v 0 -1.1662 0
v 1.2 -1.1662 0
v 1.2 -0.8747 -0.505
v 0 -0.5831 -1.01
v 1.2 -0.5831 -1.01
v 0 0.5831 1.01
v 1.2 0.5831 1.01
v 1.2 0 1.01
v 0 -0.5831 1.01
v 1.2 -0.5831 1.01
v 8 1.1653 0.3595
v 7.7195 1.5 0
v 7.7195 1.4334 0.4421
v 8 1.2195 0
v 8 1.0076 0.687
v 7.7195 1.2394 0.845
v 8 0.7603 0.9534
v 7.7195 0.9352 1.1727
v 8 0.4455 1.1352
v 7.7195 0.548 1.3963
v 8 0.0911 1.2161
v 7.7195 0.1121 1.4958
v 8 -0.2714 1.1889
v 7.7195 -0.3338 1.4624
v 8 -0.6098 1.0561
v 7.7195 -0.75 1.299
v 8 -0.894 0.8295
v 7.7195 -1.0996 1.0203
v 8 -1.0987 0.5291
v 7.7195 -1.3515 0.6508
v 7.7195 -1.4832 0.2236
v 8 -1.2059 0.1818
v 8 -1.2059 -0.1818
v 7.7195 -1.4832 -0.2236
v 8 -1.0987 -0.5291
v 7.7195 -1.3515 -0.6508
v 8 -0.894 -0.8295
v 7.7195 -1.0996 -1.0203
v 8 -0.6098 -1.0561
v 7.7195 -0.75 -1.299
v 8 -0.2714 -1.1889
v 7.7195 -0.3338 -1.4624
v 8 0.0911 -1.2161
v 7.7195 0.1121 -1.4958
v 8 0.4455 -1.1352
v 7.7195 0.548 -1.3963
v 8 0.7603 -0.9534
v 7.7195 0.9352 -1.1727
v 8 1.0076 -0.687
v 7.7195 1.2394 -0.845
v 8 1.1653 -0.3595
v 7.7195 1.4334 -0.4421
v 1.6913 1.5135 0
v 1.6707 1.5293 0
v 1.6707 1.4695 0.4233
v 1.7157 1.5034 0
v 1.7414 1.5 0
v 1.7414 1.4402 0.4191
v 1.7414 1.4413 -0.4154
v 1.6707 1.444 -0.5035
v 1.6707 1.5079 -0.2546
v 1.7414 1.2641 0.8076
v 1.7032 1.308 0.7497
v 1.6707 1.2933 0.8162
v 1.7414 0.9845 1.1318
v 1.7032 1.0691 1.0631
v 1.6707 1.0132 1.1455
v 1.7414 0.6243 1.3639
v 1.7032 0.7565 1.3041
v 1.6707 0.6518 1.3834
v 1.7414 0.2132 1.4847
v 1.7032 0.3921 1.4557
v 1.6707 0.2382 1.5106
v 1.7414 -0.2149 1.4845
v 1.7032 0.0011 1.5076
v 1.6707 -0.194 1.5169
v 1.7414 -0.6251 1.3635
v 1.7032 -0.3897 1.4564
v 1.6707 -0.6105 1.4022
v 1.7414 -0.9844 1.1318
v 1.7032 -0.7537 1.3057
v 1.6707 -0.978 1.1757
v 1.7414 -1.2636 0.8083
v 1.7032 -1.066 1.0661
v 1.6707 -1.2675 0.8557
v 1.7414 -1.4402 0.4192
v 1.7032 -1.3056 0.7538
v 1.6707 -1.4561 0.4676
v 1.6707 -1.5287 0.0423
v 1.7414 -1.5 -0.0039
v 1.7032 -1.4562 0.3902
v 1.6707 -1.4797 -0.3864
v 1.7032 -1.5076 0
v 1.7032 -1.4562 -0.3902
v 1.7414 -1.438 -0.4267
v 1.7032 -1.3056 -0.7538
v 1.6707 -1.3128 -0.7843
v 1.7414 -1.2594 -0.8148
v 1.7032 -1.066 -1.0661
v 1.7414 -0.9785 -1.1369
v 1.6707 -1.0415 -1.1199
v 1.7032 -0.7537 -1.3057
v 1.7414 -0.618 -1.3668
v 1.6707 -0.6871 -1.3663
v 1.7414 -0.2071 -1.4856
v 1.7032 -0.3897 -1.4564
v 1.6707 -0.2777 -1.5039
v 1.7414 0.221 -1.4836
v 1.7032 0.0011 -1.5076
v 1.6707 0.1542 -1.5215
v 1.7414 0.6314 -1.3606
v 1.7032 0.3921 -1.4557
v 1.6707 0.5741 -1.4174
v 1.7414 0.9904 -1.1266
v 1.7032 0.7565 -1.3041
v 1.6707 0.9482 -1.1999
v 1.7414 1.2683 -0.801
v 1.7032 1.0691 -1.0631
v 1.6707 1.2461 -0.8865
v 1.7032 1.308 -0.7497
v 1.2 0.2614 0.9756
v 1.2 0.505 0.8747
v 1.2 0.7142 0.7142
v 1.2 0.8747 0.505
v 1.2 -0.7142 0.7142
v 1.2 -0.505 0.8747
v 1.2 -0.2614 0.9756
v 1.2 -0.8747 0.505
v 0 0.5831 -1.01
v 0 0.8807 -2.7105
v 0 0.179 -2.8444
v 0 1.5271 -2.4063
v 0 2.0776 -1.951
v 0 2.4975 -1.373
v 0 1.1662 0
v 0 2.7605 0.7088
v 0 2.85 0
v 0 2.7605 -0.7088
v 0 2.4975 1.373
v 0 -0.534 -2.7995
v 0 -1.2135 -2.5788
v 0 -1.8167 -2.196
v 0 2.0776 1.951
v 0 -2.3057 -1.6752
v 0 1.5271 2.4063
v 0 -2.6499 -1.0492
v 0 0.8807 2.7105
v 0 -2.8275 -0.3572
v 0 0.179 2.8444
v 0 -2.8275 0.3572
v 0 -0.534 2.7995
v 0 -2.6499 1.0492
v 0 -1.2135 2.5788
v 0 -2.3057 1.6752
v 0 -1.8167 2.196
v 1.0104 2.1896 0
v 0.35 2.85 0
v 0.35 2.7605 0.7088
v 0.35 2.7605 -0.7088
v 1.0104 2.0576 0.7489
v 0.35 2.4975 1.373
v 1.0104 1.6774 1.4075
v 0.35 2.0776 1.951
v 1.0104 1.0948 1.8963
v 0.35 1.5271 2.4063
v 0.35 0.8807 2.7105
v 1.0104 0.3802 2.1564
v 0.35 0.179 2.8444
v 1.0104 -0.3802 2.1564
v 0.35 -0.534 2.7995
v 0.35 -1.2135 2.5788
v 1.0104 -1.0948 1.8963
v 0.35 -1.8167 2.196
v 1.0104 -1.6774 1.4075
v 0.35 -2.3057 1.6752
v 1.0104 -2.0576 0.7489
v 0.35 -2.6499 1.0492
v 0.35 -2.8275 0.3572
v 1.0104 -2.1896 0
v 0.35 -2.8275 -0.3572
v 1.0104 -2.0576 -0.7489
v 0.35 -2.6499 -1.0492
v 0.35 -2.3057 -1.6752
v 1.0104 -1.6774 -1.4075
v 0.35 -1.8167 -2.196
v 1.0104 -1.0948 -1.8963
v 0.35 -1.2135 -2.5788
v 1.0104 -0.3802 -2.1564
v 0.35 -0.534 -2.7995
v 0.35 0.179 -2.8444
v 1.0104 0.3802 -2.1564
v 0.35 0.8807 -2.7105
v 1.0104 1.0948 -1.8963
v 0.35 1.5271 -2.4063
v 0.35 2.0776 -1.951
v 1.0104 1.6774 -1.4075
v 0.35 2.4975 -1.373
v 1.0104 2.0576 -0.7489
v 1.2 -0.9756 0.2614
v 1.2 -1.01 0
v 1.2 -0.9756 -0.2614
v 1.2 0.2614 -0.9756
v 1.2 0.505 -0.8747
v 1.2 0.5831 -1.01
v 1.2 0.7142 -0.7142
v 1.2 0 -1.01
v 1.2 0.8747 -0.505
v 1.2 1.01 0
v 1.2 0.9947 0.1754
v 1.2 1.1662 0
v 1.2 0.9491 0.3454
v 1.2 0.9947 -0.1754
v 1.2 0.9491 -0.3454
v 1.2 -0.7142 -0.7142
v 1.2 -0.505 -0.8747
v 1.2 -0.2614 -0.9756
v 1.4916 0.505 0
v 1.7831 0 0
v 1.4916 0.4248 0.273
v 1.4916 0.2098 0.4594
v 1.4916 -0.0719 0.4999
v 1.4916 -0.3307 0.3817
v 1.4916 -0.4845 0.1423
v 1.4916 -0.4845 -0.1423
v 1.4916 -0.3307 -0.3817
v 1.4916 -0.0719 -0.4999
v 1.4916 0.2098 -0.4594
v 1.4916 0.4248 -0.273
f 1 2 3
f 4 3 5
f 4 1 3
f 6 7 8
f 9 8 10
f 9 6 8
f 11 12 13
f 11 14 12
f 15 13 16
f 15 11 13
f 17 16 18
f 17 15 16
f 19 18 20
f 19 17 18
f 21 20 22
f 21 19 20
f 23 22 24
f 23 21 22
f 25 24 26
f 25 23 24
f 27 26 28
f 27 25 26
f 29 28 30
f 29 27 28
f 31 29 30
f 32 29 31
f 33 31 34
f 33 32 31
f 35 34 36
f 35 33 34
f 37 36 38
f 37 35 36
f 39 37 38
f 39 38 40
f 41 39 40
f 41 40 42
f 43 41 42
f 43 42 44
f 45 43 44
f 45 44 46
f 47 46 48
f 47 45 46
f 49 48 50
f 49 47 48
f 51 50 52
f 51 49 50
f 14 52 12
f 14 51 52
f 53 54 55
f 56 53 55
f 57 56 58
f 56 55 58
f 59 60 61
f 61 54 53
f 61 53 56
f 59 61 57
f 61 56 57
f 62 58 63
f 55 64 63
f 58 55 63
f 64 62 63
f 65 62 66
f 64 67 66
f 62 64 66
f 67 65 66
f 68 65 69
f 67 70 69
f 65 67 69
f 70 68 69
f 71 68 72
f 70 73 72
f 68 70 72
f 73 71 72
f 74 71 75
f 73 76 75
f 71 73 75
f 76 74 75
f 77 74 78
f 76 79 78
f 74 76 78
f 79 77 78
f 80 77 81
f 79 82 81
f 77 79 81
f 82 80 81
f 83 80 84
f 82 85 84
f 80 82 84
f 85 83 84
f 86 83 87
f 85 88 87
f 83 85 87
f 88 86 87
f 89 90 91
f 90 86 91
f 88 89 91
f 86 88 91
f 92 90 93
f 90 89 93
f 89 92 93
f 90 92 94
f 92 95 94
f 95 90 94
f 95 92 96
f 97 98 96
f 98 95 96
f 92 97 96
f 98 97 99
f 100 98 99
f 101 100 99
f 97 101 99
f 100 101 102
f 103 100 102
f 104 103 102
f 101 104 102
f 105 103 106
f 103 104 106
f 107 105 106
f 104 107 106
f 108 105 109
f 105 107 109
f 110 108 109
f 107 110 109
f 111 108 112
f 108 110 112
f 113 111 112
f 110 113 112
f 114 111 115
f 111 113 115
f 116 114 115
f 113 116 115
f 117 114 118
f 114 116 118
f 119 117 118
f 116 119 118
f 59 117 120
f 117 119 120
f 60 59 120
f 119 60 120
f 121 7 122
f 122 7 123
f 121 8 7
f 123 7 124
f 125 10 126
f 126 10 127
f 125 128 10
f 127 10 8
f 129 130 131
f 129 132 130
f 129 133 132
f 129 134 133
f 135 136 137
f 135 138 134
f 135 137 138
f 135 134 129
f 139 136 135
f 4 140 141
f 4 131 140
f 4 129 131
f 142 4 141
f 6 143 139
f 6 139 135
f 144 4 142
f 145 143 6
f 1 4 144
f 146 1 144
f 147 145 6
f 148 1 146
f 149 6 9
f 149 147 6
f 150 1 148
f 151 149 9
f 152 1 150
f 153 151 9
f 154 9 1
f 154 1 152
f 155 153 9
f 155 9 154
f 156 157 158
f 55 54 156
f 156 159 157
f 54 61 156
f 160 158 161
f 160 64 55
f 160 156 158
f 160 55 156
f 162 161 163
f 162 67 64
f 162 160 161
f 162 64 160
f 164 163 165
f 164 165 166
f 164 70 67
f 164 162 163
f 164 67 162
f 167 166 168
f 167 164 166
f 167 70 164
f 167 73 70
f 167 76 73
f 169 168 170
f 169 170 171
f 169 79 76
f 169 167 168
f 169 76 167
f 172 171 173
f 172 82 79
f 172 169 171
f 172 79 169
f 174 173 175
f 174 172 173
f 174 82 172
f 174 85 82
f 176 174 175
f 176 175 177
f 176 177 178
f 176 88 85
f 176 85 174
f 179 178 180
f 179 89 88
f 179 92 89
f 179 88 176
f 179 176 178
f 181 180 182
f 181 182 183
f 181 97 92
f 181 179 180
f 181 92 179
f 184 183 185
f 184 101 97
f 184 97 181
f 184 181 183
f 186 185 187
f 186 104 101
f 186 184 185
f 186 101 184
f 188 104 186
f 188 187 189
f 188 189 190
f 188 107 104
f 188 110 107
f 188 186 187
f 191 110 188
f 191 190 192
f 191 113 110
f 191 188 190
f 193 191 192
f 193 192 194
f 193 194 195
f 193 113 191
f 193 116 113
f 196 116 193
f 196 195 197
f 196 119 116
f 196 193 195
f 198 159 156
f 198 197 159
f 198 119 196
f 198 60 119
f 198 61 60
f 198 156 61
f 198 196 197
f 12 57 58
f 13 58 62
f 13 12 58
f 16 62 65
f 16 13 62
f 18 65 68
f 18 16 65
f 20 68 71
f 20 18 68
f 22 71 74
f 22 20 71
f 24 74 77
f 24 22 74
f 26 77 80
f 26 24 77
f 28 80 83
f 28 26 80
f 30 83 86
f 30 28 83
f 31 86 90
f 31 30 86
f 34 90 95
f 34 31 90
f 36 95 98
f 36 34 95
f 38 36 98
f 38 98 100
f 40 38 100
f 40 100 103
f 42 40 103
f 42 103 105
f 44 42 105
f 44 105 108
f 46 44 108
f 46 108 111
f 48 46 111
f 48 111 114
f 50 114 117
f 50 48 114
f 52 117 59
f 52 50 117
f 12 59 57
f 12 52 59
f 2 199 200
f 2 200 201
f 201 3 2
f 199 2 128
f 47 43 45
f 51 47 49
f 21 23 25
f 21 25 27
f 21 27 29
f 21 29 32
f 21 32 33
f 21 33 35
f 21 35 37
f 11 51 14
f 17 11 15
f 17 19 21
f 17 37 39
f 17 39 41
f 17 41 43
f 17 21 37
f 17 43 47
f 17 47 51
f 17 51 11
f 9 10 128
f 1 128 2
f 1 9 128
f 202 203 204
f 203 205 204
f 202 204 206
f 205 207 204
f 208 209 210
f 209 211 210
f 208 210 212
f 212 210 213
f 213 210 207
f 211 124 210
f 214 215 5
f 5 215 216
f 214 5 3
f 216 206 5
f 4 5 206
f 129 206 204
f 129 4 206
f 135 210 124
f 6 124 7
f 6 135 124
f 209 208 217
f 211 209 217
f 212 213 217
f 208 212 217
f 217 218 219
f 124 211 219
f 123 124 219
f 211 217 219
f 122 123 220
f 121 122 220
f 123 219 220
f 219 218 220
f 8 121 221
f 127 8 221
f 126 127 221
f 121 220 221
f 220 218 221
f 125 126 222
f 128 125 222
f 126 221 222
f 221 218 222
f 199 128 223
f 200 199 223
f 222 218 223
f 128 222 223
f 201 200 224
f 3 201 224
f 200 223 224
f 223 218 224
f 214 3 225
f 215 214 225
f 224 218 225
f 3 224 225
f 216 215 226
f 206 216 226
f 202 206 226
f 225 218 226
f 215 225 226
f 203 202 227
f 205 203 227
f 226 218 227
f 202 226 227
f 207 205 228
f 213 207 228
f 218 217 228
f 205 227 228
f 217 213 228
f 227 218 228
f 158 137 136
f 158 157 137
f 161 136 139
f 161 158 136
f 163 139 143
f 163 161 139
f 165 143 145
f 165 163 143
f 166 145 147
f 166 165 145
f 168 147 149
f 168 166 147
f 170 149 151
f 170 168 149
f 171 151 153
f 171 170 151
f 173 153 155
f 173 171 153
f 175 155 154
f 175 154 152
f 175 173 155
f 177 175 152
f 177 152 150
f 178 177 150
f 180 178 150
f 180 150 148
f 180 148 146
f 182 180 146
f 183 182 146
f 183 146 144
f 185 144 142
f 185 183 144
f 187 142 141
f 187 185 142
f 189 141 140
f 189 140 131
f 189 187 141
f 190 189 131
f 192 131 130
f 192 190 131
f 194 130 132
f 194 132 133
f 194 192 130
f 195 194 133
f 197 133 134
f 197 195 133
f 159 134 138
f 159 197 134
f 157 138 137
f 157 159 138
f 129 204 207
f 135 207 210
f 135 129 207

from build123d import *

# Parameters (mm, degrees)
FILLET1_R   = 0.1
HEX_2_DEPTH = 1.2


with BuildPart() as part:
    # BodySke → BaseBody (revolve)
    with BuildSketch(Plane.XY):
        Polygon((0, 0), (0, 2.85), (0.35, 2.85), (1.7, 1.5), (7.7195, 1.5), (8, 1.2195), (8, 0), align=None)
    revolve(axis=Axis((0, 0, 0), (1, 0, 0)))

    # Fillet1
    fillet1_edges = [part.edges().sort_by_distance(p)[0] for p in [
        (1.7, -1.5, 0),
    ]]
    fillet(fillet1_edges, radius=FILLET1_R)

    # Sketch2 → PreBroach (revolve, cut)
    with BuildSketch(Plane.XY):
        Polygon((0, 1.01), (1.2, 1.01), (1.783123772, 0), (0, 0), align=None)
    revolve(axis=Axis((0, 0, 0), (1, 0, 0)), mode=Mode.SUBTRACT)

    # Sketch3 → Hex 2 (cut)
    with BuildSketch(Plane.ZY):
        Polygon((-1.01, -0.583123772), (-1.01, 0.583123772), (0, 1.166247544), (1.01, 0.583123772), (1.01, -0.583123772), (0, -1.166247544), align=None)
    extrude(amount=-HEX_2_DEPTH, mode=Mode.SUBTRACT)


solid = part.part
